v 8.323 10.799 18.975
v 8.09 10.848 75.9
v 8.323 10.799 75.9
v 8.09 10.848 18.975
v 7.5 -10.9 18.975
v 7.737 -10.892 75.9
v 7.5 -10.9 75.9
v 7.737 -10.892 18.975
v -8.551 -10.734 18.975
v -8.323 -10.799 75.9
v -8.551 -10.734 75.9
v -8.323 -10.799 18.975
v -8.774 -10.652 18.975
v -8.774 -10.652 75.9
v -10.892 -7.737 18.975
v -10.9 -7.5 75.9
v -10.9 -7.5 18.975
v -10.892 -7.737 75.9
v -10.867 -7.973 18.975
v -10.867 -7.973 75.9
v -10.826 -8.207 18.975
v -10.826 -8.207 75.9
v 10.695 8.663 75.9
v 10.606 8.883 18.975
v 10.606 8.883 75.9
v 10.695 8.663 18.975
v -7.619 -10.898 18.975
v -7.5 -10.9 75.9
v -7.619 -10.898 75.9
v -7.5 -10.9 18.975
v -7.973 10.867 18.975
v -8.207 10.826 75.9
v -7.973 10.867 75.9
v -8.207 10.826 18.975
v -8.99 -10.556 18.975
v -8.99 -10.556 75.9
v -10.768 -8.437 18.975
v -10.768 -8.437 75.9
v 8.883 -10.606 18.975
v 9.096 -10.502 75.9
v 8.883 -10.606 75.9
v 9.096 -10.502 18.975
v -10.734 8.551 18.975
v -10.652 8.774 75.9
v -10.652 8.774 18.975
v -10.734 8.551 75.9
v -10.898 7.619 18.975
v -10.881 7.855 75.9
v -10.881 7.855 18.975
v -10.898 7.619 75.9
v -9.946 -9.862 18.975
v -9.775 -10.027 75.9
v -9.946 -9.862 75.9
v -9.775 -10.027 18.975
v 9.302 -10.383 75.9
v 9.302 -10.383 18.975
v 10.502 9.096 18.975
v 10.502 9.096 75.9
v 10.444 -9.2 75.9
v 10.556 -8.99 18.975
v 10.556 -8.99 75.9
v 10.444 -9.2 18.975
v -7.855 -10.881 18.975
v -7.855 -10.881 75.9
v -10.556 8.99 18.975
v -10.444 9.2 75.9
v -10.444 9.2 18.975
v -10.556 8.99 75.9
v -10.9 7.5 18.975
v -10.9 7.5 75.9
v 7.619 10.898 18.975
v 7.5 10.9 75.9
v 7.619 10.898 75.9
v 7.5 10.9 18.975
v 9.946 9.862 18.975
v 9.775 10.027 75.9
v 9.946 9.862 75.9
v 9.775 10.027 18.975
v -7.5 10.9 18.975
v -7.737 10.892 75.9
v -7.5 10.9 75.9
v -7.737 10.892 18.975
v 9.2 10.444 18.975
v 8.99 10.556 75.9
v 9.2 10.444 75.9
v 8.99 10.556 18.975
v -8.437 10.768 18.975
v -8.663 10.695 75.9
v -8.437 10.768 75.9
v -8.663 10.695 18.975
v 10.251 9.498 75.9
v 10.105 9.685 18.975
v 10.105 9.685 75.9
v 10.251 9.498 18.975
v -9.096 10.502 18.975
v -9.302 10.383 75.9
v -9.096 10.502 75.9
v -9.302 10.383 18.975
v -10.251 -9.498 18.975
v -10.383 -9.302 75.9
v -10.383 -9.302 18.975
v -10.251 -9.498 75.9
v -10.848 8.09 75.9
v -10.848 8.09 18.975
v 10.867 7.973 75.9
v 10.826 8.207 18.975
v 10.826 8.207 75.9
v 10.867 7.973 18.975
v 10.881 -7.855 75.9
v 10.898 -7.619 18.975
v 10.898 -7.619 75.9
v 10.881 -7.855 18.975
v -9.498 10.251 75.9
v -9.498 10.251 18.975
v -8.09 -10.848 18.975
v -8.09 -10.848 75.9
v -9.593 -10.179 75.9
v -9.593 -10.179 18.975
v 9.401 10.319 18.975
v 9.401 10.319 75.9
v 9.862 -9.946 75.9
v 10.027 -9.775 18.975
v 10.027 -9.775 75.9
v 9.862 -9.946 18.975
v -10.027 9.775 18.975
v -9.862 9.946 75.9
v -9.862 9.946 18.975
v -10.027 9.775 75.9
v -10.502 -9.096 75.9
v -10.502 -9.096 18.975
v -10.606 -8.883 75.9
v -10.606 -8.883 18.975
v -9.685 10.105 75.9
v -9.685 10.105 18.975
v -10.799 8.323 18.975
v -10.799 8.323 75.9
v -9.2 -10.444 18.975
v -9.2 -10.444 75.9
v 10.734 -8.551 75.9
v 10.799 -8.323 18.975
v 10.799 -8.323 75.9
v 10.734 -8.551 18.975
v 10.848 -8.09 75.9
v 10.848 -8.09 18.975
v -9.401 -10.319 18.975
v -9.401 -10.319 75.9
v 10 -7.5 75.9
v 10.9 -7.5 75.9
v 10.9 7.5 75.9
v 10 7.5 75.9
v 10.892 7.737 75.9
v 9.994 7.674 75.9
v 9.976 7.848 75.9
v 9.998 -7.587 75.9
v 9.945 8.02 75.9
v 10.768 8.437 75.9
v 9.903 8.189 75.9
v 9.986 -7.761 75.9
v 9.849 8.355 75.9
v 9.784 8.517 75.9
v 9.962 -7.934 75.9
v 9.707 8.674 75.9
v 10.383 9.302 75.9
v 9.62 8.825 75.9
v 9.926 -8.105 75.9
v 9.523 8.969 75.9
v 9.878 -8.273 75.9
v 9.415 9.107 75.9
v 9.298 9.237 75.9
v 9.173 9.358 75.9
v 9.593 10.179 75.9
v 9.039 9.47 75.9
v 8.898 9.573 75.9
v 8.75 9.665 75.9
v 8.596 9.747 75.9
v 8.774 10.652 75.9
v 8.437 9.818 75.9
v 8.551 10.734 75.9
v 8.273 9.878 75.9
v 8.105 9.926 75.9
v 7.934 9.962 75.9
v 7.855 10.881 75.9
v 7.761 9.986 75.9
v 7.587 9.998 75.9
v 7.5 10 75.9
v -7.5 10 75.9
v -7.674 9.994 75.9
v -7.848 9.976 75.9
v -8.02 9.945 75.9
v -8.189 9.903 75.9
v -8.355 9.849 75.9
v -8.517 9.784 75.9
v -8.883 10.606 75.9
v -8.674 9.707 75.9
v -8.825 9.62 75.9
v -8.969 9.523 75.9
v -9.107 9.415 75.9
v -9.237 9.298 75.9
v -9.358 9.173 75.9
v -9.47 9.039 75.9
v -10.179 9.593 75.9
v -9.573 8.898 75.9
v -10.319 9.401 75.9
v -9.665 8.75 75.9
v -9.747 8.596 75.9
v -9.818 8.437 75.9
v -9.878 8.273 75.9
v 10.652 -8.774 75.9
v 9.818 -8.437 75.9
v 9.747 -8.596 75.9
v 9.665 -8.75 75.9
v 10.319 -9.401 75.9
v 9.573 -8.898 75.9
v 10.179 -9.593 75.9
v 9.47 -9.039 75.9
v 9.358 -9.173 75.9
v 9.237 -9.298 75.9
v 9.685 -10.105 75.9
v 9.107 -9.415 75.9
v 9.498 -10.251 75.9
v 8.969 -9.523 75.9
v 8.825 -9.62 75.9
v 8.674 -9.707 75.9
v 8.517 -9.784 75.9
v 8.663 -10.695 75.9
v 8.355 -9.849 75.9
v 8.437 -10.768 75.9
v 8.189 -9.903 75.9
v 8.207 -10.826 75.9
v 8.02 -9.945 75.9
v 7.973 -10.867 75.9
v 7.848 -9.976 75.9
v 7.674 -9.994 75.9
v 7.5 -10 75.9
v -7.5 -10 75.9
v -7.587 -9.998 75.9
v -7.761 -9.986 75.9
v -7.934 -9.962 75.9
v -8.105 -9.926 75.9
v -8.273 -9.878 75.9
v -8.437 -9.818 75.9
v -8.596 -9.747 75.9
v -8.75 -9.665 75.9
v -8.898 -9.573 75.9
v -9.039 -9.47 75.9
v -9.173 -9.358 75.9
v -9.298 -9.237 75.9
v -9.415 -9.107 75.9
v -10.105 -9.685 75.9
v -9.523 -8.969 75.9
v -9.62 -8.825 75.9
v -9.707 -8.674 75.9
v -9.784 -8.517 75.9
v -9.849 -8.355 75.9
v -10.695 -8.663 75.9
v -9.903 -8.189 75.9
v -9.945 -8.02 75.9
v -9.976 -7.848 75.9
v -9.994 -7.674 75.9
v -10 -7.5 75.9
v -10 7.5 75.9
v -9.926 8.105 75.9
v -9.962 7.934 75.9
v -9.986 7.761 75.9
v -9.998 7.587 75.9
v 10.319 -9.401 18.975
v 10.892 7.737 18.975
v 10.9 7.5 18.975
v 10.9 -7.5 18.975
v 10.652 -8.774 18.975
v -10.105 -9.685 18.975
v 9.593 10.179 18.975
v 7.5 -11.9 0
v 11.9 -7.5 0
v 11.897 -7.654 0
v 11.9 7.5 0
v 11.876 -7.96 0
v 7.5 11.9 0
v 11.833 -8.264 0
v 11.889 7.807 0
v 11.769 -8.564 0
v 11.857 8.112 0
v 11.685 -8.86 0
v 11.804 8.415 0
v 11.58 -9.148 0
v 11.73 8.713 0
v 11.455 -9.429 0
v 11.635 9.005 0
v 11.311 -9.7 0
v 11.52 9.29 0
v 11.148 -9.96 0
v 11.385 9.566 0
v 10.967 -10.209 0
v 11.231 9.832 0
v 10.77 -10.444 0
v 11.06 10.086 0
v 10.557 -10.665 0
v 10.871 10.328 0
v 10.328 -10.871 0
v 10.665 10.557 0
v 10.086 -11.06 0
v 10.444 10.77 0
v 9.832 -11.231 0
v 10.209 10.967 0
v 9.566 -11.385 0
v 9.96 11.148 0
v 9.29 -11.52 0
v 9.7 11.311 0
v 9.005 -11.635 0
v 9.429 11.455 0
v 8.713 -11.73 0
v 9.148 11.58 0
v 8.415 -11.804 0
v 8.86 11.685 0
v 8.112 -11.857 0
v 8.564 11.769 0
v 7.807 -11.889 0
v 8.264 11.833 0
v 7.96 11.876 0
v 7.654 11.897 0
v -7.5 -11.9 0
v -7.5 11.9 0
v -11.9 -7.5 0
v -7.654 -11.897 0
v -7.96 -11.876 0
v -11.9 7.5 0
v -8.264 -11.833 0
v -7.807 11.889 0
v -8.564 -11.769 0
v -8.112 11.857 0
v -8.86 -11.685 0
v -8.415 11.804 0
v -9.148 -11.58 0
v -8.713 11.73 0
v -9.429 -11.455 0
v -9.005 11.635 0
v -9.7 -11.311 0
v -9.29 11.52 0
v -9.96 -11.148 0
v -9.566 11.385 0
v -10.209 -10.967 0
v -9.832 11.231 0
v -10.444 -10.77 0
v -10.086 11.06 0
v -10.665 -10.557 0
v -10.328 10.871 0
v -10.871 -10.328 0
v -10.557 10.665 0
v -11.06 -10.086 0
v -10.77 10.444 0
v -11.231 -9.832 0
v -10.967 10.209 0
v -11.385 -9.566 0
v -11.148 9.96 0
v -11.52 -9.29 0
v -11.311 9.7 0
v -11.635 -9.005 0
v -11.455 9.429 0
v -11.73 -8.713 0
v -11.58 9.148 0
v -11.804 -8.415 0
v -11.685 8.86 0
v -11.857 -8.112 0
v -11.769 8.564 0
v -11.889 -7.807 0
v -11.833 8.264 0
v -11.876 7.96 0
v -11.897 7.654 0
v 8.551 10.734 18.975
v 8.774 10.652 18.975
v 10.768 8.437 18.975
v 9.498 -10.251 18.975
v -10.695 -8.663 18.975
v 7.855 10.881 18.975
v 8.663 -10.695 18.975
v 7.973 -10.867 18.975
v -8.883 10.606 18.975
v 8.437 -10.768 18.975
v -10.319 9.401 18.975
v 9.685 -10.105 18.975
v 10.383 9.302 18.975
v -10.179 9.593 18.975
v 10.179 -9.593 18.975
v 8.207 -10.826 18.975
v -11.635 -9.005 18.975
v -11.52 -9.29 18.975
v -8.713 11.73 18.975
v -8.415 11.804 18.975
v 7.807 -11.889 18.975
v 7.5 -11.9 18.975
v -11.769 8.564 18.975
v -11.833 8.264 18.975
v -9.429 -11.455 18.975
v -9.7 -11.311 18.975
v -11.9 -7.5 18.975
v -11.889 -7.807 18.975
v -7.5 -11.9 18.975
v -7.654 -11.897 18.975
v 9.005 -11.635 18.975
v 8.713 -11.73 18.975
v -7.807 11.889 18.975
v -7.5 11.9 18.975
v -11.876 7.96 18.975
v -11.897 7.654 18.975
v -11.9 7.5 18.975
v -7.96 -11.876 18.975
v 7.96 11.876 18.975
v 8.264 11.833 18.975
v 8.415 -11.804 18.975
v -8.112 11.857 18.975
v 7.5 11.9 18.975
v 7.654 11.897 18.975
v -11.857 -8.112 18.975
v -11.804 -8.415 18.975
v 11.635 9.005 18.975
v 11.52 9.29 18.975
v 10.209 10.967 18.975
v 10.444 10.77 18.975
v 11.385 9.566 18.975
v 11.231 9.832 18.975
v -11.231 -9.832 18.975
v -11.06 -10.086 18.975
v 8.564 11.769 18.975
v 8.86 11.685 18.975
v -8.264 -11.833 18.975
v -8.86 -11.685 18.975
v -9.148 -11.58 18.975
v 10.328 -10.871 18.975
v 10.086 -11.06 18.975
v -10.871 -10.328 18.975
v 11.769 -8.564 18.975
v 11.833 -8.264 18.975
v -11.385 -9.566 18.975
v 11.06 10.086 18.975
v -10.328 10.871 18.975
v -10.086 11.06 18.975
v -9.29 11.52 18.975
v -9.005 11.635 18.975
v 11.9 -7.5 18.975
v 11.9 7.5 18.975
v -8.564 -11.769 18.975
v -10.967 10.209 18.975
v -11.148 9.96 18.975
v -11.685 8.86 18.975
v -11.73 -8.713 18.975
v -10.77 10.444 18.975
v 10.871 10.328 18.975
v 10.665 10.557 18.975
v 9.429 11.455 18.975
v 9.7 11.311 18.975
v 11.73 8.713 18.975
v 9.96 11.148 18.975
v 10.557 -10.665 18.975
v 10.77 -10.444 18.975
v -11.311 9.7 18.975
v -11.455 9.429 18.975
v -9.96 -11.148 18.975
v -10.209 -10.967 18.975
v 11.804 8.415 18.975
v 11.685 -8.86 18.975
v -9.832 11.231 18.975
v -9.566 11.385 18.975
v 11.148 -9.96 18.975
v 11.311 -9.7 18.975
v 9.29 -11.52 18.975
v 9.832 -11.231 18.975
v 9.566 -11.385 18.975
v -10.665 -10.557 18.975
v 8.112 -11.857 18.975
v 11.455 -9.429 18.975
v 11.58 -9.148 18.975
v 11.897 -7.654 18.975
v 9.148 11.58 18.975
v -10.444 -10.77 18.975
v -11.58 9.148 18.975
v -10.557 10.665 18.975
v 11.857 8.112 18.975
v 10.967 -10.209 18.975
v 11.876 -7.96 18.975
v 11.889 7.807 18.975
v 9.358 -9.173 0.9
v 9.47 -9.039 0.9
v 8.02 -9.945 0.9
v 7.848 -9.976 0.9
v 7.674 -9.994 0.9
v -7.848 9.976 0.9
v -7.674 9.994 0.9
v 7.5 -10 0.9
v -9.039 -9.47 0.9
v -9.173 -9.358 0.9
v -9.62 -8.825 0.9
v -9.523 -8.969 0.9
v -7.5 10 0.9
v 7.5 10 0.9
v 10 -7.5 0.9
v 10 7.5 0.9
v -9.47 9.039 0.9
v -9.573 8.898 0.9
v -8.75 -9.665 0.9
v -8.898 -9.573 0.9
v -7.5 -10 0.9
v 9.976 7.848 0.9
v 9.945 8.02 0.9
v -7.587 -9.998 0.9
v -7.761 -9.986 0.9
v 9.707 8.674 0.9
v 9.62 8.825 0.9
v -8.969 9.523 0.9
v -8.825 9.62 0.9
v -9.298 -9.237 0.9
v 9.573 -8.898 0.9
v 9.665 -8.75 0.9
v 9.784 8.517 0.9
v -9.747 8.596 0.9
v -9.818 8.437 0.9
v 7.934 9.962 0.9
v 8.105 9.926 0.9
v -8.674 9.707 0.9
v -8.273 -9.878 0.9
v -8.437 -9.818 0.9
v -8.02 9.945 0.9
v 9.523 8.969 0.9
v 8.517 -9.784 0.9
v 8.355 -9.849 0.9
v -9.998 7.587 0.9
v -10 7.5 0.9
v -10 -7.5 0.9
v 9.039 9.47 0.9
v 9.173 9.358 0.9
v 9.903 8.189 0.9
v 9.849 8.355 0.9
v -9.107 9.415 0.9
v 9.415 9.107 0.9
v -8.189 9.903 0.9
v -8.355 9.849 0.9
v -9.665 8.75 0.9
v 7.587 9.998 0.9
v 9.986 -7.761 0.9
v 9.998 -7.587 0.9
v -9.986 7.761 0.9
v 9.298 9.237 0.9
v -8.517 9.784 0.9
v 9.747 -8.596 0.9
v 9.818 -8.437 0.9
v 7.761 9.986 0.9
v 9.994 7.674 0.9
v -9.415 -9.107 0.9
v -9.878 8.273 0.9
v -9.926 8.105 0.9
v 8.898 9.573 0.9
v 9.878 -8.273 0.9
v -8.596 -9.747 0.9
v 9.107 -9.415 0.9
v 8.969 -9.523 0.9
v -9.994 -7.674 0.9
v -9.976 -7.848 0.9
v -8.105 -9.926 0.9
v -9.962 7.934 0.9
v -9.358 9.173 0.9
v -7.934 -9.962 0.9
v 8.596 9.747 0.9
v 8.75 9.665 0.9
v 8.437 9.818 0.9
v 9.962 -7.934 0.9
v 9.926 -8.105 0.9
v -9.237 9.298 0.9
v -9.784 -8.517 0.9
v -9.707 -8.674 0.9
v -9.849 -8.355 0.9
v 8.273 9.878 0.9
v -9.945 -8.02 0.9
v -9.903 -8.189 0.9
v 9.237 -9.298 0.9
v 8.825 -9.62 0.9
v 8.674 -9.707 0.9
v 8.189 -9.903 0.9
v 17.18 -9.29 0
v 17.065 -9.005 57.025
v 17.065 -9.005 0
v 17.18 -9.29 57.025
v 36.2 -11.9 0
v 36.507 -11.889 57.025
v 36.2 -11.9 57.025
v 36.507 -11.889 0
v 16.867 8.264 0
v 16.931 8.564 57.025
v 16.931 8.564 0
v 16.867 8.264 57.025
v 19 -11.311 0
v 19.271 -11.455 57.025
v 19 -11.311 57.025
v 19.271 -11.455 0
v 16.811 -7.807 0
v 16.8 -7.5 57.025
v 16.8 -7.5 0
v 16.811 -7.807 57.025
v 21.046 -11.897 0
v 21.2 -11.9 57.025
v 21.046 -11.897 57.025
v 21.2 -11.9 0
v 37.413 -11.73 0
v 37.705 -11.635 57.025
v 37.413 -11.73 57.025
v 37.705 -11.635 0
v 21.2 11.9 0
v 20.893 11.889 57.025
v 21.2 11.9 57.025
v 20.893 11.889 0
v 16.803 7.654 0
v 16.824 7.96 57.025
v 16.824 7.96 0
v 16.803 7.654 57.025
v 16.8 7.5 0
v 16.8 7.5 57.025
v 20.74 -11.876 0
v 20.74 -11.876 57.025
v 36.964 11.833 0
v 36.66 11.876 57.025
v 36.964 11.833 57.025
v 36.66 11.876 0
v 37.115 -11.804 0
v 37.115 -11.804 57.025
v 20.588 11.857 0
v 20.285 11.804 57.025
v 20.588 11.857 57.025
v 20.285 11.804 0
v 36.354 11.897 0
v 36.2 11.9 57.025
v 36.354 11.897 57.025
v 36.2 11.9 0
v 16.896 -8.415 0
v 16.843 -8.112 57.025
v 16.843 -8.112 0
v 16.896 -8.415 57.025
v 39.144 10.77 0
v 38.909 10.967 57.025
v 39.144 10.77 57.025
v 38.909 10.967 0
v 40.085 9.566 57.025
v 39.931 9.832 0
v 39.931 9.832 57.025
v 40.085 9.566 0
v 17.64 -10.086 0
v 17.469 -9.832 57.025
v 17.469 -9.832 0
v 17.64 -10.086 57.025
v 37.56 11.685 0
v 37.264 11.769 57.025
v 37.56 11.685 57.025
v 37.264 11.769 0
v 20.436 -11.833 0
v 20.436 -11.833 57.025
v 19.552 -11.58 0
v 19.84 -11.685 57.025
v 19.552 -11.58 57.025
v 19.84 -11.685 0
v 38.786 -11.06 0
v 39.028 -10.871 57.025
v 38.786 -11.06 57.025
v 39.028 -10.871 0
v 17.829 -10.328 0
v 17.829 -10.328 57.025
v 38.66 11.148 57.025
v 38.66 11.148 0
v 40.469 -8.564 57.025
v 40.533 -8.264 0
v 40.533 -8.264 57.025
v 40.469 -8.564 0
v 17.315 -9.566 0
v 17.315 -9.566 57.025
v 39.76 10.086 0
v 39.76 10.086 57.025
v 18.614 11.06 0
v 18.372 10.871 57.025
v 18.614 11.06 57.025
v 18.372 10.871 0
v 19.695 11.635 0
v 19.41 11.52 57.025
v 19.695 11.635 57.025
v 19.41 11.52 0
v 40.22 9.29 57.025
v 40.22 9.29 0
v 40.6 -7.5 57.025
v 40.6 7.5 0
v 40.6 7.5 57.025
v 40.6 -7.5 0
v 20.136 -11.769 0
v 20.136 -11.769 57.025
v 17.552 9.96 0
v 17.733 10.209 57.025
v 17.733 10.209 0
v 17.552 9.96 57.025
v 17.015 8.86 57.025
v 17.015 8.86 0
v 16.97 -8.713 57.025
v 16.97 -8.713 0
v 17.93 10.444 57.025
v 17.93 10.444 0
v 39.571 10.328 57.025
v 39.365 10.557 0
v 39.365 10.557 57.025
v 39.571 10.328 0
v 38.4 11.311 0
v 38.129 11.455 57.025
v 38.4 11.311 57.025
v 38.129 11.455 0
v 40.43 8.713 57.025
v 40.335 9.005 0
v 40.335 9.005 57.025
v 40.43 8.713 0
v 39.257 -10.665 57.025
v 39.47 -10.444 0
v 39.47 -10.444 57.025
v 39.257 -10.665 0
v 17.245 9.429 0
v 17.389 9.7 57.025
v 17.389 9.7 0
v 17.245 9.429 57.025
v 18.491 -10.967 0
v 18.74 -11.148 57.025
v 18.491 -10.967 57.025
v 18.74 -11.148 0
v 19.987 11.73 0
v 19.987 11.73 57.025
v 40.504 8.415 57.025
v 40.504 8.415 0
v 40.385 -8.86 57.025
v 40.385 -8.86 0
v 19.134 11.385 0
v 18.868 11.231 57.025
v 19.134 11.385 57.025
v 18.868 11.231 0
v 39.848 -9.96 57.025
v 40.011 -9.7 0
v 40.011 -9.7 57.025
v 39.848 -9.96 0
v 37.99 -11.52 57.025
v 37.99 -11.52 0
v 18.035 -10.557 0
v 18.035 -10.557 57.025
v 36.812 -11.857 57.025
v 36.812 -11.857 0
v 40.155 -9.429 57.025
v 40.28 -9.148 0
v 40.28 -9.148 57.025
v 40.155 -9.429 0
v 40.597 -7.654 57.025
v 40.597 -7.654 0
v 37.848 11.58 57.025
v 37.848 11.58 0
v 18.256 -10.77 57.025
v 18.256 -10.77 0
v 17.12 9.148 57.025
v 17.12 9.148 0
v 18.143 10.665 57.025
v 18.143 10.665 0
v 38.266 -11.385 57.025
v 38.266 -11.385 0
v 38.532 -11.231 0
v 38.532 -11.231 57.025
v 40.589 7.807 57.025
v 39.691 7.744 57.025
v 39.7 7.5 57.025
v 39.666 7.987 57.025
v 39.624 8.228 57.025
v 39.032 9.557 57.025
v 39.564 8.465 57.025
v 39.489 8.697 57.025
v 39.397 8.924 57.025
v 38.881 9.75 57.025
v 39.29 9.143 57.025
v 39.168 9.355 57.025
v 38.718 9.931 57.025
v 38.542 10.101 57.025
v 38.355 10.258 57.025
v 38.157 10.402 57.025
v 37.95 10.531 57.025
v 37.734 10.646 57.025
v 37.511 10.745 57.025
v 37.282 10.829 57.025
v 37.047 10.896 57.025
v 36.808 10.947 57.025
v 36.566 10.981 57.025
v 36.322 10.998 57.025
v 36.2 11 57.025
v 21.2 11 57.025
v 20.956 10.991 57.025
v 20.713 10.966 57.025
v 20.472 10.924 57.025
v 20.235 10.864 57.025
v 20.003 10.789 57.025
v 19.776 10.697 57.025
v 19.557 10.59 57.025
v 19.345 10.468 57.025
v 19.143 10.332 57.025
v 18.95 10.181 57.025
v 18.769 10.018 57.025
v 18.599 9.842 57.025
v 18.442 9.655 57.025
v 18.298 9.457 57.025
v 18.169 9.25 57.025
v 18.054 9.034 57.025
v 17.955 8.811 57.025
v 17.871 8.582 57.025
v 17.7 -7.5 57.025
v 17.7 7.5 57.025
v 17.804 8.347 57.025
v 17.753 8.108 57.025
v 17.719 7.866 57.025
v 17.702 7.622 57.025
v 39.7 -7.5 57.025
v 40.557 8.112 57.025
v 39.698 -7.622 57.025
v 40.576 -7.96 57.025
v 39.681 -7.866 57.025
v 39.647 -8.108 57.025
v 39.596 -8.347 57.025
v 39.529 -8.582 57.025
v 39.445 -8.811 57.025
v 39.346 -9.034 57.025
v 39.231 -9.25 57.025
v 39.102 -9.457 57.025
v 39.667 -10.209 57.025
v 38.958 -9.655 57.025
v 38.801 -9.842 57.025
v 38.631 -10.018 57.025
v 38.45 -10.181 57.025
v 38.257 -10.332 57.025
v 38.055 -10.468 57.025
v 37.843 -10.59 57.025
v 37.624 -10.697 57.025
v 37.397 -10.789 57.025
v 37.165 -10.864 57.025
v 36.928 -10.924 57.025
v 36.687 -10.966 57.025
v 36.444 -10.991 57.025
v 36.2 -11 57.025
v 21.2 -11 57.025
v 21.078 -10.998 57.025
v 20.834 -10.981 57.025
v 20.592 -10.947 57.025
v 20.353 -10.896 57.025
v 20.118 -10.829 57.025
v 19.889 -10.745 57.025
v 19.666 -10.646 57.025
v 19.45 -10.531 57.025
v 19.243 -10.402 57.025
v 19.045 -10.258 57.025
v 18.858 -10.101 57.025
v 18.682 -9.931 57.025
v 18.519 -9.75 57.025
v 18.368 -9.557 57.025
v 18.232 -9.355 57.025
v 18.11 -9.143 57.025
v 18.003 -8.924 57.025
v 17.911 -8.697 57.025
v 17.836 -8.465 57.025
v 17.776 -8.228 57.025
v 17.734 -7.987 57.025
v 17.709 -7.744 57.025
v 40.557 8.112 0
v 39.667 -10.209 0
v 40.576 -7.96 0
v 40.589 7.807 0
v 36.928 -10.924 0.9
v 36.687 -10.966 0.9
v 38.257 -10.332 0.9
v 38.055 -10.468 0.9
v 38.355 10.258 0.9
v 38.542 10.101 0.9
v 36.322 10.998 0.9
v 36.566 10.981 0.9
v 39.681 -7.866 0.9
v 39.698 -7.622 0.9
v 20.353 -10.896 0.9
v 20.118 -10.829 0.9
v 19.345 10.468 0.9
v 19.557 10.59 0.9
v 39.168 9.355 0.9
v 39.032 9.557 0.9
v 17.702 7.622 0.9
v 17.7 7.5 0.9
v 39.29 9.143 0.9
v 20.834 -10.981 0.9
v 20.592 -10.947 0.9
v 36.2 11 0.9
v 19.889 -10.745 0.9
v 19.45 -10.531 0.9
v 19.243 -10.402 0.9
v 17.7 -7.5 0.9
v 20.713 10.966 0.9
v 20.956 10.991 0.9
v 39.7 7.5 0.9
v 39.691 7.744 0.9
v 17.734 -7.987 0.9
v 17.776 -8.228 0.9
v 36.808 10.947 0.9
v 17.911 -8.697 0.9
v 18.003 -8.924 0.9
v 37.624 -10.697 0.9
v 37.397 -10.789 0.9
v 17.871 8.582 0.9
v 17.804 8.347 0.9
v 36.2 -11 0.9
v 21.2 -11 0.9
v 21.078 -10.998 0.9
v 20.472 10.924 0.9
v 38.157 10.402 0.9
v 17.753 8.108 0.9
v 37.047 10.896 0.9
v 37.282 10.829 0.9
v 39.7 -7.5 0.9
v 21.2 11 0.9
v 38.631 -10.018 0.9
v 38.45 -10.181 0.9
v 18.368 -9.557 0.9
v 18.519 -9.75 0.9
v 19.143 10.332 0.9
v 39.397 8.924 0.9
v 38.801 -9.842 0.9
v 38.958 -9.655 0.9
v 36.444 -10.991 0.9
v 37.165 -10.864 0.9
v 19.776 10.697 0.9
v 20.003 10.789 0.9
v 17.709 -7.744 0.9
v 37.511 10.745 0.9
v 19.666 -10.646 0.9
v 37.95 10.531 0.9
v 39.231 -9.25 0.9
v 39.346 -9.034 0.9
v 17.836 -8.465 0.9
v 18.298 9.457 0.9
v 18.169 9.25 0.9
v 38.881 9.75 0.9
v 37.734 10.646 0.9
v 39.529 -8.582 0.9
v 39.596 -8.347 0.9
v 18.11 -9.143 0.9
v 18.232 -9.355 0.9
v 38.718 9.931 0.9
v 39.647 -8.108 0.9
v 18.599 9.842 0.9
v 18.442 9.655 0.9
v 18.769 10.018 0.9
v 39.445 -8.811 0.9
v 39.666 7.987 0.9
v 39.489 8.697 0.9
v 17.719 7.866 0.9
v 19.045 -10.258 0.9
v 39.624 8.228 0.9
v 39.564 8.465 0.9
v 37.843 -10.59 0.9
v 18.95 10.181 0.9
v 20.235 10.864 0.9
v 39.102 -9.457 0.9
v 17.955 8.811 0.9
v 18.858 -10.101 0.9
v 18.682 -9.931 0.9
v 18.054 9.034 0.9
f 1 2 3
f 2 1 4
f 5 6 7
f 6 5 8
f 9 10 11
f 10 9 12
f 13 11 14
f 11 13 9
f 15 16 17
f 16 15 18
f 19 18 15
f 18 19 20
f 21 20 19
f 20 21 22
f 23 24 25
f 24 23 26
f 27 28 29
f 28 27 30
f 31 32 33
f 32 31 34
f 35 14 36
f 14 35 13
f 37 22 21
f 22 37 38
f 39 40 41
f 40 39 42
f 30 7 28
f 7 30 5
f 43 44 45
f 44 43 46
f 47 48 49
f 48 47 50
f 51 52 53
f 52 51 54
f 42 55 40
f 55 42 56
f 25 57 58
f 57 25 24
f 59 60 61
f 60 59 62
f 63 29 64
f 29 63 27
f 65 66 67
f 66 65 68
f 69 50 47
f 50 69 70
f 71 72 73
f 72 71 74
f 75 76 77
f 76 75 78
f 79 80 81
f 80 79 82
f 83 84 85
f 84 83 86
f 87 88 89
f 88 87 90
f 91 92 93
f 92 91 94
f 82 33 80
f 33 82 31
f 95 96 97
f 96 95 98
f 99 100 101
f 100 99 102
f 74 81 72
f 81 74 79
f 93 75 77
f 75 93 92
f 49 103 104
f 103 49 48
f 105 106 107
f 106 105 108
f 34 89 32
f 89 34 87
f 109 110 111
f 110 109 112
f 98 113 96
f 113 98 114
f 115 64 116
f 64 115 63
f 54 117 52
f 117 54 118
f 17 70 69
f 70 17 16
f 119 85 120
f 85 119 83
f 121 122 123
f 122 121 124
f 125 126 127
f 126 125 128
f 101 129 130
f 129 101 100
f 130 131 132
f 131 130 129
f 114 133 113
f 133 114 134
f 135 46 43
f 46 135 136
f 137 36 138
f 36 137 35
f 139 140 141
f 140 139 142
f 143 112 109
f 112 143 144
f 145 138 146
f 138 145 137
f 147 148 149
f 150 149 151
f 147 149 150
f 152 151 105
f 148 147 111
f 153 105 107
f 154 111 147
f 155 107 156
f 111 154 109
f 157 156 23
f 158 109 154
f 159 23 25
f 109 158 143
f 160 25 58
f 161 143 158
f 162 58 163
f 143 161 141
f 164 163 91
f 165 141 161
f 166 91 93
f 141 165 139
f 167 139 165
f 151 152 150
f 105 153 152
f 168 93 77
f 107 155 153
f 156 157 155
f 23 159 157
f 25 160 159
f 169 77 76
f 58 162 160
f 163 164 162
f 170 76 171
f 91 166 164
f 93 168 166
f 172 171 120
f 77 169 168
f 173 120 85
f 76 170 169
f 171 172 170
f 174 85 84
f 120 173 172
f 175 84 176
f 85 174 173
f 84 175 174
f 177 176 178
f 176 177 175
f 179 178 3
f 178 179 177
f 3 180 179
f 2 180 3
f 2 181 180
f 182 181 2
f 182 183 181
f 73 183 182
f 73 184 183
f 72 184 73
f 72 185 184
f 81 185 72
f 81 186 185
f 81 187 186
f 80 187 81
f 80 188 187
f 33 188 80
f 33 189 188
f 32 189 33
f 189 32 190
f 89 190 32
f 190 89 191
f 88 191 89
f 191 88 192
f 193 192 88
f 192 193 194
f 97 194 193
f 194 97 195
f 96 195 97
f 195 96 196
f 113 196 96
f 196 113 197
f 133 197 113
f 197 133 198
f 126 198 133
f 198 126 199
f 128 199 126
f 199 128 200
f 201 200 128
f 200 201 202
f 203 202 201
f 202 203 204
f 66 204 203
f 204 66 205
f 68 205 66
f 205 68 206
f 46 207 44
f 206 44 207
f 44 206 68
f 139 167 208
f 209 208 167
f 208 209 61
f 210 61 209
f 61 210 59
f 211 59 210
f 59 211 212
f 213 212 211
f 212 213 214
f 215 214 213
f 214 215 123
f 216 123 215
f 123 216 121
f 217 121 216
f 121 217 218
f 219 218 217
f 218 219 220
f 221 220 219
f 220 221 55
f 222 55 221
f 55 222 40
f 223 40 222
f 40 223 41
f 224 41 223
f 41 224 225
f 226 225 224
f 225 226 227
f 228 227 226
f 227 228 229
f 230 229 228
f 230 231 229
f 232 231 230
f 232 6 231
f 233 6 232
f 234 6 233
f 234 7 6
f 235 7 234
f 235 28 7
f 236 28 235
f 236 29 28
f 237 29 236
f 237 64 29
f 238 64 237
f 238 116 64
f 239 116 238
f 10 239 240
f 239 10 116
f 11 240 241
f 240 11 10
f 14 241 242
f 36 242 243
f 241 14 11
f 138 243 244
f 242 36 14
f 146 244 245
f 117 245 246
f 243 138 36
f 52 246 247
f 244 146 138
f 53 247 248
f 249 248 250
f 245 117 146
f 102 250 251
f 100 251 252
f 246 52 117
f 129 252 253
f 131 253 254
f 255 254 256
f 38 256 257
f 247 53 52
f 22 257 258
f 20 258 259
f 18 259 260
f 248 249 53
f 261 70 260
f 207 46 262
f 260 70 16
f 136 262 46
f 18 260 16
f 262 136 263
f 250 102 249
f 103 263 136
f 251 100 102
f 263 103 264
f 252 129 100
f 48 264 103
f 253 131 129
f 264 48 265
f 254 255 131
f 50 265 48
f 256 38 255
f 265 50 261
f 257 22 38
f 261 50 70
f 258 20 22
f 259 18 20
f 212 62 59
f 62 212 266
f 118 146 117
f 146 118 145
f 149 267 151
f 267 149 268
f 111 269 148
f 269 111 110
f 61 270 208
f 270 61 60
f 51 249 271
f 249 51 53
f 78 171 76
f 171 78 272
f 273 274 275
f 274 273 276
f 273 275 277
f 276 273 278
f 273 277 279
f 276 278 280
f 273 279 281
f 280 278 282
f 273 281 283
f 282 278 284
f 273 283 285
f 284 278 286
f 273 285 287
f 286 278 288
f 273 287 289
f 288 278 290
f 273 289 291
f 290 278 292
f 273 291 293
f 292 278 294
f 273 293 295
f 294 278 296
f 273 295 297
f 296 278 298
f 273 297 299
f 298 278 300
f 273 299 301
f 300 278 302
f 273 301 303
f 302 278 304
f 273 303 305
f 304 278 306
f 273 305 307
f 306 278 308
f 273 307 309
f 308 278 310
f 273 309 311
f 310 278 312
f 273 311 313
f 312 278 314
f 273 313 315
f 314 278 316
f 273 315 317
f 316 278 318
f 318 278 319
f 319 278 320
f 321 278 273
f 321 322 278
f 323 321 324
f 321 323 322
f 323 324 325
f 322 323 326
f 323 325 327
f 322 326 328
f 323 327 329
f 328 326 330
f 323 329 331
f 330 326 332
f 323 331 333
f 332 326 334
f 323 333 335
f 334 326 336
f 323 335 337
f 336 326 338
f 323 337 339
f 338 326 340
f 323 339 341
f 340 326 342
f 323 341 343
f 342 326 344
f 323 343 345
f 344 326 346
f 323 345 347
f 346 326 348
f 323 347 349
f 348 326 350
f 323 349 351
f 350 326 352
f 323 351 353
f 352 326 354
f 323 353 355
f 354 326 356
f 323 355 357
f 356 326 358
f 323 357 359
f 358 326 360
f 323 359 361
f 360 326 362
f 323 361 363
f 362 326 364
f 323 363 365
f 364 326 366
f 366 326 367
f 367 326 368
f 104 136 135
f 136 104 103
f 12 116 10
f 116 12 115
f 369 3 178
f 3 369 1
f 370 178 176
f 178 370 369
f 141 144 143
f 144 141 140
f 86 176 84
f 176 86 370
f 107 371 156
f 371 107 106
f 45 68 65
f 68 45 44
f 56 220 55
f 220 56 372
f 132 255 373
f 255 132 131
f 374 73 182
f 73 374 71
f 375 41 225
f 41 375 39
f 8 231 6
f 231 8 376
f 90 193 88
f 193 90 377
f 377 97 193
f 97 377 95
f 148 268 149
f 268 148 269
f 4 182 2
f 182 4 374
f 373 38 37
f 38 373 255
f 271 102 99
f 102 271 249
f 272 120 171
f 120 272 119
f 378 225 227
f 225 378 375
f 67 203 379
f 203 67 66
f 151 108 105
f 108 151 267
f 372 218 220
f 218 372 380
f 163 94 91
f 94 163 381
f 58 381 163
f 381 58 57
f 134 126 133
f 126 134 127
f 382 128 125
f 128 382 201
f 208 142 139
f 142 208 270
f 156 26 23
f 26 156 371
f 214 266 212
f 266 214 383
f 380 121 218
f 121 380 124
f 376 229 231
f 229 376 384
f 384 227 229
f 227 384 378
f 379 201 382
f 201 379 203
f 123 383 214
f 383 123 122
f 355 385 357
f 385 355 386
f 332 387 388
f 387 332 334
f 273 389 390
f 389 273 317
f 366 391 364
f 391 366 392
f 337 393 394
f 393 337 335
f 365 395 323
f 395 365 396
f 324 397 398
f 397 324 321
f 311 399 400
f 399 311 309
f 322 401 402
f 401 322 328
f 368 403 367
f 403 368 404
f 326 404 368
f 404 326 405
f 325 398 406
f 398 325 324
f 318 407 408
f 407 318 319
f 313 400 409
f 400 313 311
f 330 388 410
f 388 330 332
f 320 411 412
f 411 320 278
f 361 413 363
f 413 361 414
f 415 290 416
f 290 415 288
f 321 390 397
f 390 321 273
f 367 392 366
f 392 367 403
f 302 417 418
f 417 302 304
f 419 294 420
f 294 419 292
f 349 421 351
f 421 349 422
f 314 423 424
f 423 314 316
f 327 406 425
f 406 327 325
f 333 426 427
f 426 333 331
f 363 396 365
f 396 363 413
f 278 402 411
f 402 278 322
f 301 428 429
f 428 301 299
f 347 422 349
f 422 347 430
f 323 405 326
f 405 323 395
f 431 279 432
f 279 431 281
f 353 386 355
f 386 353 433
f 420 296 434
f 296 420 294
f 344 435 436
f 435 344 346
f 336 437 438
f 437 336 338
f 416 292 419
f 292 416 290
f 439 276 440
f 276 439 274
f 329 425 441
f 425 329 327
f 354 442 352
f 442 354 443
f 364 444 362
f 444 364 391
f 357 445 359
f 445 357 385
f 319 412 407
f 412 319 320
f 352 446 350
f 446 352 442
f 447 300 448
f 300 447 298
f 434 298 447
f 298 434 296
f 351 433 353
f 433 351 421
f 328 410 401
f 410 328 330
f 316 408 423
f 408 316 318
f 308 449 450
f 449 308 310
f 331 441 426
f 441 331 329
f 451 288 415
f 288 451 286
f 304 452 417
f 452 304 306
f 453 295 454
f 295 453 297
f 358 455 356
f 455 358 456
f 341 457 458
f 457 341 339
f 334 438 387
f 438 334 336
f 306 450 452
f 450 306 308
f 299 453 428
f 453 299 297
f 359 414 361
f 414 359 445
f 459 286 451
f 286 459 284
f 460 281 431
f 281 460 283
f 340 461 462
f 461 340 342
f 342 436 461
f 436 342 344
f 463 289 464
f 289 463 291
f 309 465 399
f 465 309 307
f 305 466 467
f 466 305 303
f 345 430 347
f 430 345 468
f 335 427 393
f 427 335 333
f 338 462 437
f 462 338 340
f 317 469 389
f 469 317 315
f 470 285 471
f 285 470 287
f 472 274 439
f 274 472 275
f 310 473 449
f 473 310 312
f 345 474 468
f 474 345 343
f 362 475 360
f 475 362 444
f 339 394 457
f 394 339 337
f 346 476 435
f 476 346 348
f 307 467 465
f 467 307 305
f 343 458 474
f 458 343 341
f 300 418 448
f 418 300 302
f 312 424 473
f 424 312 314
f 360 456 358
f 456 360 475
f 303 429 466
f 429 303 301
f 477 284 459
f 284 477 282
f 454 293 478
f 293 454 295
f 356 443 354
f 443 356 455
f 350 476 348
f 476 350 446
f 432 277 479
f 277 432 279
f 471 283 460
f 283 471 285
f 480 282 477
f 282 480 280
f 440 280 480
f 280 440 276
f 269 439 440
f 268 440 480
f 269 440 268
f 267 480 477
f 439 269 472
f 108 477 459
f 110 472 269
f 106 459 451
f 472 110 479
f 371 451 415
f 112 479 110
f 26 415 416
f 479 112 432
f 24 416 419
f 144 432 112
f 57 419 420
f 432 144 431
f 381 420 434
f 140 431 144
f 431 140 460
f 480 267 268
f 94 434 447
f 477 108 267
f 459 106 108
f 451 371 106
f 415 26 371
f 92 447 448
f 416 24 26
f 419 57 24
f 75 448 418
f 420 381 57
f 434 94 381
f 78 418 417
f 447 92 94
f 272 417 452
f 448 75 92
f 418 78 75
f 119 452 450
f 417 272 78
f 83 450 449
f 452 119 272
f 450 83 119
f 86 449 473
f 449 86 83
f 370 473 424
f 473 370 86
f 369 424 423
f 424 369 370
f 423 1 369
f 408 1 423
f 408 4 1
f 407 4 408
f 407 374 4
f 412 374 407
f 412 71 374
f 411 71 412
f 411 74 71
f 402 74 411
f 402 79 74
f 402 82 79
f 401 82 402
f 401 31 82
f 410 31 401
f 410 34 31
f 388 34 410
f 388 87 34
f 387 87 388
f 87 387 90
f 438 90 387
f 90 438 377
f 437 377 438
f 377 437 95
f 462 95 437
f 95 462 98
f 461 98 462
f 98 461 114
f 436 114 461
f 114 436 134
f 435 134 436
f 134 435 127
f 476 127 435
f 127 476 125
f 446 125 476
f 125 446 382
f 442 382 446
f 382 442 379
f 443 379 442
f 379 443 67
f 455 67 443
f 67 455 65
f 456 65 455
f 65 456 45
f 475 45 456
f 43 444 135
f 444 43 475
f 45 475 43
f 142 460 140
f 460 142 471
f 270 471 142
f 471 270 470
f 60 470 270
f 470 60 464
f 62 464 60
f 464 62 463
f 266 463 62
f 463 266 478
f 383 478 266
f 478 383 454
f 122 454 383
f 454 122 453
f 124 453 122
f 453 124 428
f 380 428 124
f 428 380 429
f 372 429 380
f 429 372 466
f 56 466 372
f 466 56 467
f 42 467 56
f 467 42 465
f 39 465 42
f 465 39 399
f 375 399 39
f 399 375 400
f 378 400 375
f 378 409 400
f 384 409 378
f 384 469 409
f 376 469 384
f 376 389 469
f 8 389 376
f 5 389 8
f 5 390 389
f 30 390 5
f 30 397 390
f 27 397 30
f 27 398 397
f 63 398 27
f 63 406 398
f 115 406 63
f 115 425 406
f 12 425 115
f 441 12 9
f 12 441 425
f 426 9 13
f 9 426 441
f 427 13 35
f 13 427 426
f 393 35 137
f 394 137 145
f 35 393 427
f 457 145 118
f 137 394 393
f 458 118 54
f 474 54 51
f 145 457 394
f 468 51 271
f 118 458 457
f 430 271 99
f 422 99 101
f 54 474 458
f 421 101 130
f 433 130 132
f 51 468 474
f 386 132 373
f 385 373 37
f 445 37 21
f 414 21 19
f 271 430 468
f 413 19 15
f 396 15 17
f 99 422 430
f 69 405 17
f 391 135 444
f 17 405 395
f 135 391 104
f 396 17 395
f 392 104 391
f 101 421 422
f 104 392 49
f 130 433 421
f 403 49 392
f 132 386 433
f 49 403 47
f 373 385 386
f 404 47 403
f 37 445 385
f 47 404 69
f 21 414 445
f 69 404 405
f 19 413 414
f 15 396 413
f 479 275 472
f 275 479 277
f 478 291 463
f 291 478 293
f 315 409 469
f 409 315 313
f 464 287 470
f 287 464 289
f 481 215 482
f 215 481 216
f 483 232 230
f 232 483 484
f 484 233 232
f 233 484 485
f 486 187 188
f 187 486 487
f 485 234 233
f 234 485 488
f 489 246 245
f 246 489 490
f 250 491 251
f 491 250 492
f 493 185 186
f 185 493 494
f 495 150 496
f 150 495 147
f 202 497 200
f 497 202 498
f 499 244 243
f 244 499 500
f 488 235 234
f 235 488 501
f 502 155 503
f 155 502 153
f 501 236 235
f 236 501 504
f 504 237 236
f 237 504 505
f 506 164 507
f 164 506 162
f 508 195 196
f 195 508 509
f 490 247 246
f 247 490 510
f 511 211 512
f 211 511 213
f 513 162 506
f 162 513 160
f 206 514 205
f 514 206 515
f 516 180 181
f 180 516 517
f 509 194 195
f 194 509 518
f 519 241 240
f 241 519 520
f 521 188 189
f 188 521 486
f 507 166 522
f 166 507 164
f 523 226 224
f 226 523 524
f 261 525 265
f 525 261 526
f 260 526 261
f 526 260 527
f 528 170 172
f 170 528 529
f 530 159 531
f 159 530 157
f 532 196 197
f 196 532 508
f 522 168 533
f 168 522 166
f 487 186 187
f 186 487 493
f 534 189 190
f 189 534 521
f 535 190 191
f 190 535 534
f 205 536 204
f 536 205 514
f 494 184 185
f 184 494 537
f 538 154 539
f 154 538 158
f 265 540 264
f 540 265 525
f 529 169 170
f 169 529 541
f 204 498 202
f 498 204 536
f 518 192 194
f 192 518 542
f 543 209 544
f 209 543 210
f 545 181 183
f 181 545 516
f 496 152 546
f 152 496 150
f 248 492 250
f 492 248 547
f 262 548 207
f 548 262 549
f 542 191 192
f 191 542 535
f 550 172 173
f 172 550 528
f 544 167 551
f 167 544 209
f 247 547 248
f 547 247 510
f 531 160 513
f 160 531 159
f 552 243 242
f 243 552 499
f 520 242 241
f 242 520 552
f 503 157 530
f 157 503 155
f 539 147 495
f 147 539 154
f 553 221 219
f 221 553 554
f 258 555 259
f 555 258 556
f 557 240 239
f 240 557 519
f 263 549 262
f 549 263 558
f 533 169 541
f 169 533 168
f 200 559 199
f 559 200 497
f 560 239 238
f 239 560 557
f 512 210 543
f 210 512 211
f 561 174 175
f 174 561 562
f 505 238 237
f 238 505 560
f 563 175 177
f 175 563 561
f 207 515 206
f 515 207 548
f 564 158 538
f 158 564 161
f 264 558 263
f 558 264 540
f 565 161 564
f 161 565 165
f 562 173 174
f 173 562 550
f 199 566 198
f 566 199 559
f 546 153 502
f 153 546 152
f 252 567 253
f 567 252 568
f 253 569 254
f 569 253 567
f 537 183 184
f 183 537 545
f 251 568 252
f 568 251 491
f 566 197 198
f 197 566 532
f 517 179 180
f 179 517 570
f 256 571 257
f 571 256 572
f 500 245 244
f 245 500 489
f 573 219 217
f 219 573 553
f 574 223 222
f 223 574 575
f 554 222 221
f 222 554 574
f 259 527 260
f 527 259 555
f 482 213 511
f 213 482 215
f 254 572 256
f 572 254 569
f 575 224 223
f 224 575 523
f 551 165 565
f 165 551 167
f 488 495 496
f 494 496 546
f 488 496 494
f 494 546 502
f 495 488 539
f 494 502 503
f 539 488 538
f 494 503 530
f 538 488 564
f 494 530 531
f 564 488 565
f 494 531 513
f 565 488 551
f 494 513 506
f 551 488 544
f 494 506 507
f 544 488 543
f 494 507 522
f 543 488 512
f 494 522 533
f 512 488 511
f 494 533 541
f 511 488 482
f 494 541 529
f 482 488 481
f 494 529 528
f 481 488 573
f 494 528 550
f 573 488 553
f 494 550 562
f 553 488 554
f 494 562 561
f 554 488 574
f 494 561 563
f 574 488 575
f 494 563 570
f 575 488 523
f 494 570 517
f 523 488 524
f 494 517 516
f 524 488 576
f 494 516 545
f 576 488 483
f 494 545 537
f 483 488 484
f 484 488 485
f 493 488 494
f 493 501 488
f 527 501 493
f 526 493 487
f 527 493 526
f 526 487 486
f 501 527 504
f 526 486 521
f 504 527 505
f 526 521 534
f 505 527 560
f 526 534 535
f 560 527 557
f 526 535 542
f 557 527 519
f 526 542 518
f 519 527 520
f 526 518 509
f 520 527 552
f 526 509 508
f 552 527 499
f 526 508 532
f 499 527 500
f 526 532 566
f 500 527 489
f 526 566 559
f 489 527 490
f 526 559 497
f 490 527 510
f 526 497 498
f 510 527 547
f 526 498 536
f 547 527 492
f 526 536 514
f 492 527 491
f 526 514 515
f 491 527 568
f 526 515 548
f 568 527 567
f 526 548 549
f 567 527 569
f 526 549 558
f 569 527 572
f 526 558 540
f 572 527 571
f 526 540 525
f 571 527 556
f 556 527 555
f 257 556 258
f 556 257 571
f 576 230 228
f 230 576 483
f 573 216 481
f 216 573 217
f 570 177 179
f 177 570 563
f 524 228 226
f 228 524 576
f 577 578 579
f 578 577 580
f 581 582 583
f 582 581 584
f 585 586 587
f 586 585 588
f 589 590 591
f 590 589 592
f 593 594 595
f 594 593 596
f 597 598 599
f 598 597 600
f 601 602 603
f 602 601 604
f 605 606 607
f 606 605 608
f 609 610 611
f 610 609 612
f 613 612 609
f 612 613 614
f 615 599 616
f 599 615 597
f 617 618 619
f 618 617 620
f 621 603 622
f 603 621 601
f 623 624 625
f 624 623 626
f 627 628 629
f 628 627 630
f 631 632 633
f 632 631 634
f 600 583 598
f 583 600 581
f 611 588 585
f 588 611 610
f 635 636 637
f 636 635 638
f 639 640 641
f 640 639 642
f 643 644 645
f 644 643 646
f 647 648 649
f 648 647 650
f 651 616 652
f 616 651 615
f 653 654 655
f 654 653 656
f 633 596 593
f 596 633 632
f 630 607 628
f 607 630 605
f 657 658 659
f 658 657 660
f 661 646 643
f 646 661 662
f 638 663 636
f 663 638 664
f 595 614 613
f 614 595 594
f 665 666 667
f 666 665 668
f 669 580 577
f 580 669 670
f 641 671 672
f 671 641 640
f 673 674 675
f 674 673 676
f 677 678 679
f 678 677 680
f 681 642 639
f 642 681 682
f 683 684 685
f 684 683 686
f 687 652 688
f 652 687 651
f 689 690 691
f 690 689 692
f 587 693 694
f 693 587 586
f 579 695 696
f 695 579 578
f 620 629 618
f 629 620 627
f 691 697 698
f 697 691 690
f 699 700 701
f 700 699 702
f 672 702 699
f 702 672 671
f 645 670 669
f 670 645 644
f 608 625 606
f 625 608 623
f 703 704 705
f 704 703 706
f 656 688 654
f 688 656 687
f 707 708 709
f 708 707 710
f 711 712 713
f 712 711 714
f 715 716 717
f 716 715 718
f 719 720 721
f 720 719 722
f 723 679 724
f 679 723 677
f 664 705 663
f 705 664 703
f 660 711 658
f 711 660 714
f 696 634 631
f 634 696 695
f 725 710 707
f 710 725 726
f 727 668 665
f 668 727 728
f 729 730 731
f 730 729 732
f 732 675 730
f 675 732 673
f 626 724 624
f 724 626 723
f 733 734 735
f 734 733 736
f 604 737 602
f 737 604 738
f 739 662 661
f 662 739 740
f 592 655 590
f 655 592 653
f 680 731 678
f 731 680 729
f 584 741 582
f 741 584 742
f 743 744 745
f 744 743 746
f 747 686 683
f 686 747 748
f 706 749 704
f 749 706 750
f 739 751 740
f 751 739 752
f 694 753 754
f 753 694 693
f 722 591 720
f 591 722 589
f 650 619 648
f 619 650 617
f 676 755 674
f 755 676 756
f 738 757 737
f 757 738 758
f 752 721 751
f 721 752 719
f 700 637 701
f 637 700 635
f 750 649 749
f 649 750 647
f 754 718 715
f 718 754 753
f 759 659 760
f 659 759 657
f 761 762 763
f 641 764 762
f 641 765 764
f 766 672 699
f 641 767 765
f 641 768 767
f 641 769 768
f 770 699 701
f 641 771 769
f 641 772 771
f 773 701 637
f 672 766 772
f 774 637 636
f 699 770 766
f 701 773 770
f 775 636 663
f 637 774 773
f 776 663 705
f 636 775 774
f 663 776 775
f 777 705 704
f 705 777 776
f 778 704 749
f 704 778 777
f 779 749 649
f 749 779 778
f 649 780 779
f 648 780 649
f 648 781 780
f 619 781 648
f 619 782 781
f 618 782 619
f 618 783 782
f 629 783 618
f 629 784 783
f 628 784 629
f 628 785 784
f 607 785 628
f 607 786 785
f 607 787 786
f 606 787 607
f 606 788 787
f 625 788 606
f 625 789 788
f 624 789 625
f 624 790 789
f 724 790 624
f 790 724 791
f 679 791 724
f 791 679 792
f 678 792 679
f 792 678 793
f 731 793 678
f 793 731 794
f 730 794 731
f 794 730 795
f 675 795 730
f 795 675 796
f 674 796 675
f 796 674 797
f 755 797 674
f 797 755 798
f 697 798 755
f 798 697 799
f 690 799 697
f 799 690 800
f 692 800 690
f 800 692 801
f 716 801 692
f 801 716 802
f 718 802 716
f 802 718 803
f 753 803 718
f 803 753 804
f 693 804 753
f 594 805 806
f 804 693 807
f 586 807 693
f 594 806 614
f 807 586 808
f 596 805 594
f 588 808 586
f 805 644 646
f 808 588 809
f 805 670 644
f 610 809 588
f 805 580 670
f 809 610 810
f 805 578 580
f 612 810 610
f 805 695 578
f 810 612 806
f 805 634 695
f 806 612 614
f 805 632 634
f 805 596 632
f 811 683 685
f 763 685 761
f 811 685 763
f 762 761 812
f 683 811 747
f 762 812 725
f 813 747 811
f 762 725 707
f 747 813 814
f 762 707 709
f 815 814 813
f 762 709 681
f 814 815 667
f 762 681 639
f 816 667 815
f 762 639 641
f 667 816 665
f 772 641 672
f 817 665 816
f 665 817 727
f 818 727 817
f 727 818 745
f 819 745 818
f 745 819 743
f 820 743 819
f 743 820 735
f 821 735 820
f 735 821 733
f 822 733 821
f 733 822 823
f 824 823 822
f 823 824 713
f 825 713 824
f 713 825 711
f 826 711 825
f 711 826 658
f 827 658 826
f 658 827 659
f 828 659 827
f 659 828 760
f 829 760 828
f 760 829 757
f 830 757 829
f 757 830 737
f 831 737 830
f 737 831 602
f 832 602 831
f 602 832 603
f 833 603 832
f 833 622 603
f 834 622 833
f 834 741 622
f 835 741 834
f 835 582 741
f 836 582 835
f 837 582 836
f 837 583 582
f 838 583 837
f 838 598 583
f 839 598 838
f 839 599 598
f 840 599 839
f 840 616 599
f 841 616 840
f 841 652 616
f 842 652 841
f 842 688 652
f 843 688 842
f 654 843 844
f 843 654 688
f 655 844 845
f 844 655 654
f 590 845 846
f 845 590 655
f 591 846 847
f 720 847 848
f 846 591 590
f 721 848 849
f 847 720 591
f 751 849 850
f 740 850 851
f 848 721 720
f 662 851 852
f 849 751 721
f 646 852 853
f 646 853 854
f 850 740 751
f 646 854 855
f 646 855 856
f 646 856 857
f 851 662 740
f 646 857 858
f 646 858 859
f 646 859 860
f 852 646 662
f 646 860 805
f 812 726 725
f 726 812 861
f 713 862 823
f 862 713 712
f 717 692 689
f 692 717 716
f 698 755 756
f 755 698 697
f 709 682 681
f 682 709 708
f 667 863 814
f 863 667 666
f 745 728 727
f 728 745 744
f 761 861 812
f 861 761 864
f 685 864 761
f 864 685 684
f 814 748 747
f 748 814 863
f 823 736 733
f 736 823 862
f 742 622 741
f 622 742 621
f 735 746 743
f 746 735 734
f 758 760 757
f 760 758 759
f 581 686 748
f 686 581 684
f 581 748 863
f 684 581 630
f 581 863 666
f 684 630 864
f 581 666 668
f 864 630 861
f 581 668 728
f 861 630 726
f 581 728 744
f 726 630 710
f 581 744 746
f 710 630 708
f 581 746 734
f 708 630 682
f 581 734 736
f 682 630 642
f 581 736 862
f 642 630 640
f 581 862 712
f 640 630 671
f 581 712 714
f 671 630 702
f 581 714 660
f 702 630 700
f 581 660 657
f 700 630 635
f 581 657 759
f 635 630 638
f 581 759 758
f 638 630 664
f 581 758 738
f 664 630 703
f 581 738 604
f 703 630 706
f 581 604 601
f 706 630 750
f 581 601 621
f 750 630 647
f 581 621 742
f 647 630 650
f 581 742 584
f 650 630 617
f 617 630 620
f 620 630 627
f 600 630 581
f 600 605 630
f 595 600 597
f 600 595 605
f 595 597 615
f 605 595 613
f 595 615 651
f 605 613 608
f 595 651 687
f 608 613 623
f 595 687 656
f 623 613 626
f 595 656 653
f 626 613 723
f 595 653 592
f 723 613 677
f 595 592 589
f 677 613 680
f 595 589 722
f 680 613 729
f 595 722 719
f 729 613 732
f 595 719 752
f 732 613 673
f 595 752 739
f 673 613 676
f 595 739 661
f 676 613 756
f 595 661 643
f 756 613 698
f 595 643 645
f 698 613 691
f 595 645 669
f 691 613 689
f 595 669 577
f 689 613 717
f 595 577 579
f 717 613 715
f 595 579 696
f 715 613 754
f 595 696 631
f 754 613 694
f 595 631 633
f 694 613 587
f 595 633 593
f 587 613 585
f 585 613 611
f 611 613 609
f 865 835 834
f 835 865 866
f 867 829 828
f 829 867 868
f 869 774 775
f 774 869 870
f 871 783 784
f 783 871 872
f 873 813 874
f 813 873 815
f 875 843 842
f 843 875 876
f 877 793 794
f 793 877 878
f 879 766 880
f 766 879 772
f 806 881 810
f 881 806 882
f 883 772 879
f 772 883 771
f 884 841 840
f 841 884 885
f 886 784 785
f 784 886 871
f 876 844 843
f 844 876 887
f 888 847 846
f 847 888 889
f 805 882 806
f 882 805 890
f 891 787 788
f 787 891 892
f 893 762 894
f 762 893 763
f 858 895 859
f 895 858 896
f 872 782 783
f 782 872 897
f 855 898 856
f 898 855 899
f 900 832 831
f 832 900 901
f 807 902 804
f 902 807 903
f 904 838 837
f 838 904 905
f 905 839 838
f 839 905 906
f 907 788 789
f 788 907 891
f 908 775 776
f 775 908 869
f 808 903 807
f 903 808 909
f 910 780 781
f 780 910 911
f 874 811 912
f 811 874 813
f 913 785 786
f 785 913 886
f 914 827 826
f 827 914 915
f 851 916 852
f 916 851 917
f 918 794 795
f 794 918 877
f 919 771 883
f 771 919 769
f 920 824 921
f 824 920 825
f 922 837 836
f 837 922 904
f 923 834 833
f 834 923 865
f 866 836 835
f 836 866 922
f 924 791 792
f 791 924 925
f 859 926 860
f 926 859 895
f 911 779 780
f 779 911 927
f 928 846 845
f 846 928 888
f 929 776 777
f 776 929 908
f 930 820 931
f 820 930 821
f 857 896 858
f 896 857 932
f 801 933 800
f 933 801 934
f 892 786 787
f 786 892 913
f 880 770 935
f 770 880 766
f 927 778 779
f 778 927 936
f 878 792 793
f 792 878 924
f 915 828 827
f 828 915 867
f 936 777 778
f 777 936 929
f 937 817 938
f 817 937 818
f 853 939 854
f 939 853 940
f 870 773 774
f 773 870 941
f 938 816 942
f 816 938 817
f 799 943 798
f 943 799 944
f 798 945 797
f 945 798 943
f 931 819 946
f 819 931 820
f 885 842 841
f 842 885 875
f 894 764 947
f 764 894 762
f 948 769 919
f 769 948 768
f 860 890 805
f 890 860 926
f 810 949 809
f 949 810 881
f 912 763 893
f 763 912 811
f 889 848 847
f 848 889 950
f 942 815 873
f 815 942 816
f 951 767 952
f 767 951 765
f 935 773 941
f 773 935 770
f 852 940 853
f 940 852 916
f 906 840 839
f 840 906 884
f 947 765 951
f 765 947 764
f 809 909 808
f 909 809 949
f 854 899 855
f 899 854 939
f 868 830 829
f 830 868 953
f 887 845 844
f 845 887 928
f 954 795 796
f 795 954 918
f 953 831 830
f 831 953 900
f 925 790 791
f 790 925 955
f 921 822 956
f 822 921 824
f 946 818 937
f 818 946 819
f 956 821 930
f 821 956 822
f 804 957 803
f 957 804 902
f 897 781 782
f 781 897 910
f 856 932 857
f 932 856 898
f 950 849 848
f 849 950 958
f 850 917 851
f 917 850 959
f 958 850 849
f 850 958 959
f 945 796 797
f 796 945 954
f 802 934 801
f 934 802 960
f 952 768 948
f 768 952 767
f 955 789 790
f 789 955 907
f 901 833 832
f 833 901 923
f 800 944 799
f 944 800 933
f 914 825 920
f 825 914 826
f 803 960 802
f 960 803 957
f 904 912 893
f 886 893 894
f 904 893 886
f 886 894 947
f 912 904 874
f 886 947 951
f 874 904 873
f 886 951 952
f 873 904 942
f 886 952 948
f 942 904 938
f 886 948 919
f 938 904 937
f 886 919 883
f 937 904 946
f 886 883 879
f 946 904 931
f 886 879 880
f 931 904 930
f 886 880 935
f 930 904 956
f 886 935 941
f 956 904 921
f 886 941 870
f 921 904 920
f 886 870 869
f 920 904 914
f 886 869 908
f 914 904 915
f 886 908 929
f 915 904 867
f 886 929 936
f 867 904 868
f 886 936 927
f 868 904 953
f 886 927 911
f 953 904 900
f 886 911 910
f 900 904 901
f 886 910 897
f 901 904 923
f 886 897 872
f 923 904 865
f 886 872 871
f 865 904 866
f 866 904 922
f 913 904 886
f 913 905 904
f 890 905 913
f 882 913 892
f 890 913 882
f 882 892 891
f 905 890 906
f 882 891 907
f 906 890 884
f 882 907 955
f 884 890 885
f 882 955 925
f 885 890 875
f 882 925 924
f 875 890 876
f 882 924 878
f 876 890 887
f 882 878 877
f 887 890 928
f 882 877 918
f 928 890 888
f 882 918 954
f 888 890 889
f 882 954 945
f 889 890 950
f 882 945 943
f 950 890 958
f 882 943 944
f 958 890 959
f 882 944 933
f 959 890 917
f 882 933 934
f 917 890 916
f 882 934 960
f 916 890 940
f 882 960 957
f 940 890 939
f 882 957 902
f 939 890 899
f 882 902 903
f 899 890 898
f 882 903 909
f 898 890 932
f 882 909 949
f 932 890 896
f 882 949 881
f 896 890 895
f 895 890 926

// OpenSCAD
$fa=4 + 0; // default minimum facet angle is now 0.5
$fs=0.05 + 0; // default minimum facet size is now 0.05 mm
eps = .001 + 0;

// Inner Height of container
zi = 75;
// Inner Width of container
xi = 20;
// Inner Length of container
yi = 20;
// Radius of inner chamfer (the rest expand from there);
ri = 2.5;

Z = zi;
X = xi - ri * 2;
Y = yi - ri * 2;

// Lid Overlap Ratio
ql = .75;

// Tolerance for lid fit
t = .1;

// Thickness of all walls
tw = .9;

// Enable or disable extra width on base for lid to hit
baseLip = true;

// Gap between parts (remove the +0 to make editable)
gapBetween = 5 + 0;

union() {
  difference() {
    union() {
        linear_extrude(Z + tw) offset(r = ri + tw) square([X, Y], center = true);
        if (baseLip) linear_extrude((Z + tw) * (1 - ql)) offset(r = ri + tw * 2 + t) square([X, Y], center = true);
    }
    translate([0, 0, tw])  linear_extrude(Z + eps) offset(r = ri) square([X, Y], center = true);
  }
  translate([xi + tw * 3 + t + (baseLip ? tw : 0) + gapBetween, 0, 0]) difference() {
    linear_extrude((Z + tw) * ql + t) offset(r = ri + tw * 2 + t) square([X, Y], center = true);
    translate([0, 0, tw]) linear_extrude(Z + eps) offset(r = ri + tw + t) square([X, Y], center = true);
  }
}
